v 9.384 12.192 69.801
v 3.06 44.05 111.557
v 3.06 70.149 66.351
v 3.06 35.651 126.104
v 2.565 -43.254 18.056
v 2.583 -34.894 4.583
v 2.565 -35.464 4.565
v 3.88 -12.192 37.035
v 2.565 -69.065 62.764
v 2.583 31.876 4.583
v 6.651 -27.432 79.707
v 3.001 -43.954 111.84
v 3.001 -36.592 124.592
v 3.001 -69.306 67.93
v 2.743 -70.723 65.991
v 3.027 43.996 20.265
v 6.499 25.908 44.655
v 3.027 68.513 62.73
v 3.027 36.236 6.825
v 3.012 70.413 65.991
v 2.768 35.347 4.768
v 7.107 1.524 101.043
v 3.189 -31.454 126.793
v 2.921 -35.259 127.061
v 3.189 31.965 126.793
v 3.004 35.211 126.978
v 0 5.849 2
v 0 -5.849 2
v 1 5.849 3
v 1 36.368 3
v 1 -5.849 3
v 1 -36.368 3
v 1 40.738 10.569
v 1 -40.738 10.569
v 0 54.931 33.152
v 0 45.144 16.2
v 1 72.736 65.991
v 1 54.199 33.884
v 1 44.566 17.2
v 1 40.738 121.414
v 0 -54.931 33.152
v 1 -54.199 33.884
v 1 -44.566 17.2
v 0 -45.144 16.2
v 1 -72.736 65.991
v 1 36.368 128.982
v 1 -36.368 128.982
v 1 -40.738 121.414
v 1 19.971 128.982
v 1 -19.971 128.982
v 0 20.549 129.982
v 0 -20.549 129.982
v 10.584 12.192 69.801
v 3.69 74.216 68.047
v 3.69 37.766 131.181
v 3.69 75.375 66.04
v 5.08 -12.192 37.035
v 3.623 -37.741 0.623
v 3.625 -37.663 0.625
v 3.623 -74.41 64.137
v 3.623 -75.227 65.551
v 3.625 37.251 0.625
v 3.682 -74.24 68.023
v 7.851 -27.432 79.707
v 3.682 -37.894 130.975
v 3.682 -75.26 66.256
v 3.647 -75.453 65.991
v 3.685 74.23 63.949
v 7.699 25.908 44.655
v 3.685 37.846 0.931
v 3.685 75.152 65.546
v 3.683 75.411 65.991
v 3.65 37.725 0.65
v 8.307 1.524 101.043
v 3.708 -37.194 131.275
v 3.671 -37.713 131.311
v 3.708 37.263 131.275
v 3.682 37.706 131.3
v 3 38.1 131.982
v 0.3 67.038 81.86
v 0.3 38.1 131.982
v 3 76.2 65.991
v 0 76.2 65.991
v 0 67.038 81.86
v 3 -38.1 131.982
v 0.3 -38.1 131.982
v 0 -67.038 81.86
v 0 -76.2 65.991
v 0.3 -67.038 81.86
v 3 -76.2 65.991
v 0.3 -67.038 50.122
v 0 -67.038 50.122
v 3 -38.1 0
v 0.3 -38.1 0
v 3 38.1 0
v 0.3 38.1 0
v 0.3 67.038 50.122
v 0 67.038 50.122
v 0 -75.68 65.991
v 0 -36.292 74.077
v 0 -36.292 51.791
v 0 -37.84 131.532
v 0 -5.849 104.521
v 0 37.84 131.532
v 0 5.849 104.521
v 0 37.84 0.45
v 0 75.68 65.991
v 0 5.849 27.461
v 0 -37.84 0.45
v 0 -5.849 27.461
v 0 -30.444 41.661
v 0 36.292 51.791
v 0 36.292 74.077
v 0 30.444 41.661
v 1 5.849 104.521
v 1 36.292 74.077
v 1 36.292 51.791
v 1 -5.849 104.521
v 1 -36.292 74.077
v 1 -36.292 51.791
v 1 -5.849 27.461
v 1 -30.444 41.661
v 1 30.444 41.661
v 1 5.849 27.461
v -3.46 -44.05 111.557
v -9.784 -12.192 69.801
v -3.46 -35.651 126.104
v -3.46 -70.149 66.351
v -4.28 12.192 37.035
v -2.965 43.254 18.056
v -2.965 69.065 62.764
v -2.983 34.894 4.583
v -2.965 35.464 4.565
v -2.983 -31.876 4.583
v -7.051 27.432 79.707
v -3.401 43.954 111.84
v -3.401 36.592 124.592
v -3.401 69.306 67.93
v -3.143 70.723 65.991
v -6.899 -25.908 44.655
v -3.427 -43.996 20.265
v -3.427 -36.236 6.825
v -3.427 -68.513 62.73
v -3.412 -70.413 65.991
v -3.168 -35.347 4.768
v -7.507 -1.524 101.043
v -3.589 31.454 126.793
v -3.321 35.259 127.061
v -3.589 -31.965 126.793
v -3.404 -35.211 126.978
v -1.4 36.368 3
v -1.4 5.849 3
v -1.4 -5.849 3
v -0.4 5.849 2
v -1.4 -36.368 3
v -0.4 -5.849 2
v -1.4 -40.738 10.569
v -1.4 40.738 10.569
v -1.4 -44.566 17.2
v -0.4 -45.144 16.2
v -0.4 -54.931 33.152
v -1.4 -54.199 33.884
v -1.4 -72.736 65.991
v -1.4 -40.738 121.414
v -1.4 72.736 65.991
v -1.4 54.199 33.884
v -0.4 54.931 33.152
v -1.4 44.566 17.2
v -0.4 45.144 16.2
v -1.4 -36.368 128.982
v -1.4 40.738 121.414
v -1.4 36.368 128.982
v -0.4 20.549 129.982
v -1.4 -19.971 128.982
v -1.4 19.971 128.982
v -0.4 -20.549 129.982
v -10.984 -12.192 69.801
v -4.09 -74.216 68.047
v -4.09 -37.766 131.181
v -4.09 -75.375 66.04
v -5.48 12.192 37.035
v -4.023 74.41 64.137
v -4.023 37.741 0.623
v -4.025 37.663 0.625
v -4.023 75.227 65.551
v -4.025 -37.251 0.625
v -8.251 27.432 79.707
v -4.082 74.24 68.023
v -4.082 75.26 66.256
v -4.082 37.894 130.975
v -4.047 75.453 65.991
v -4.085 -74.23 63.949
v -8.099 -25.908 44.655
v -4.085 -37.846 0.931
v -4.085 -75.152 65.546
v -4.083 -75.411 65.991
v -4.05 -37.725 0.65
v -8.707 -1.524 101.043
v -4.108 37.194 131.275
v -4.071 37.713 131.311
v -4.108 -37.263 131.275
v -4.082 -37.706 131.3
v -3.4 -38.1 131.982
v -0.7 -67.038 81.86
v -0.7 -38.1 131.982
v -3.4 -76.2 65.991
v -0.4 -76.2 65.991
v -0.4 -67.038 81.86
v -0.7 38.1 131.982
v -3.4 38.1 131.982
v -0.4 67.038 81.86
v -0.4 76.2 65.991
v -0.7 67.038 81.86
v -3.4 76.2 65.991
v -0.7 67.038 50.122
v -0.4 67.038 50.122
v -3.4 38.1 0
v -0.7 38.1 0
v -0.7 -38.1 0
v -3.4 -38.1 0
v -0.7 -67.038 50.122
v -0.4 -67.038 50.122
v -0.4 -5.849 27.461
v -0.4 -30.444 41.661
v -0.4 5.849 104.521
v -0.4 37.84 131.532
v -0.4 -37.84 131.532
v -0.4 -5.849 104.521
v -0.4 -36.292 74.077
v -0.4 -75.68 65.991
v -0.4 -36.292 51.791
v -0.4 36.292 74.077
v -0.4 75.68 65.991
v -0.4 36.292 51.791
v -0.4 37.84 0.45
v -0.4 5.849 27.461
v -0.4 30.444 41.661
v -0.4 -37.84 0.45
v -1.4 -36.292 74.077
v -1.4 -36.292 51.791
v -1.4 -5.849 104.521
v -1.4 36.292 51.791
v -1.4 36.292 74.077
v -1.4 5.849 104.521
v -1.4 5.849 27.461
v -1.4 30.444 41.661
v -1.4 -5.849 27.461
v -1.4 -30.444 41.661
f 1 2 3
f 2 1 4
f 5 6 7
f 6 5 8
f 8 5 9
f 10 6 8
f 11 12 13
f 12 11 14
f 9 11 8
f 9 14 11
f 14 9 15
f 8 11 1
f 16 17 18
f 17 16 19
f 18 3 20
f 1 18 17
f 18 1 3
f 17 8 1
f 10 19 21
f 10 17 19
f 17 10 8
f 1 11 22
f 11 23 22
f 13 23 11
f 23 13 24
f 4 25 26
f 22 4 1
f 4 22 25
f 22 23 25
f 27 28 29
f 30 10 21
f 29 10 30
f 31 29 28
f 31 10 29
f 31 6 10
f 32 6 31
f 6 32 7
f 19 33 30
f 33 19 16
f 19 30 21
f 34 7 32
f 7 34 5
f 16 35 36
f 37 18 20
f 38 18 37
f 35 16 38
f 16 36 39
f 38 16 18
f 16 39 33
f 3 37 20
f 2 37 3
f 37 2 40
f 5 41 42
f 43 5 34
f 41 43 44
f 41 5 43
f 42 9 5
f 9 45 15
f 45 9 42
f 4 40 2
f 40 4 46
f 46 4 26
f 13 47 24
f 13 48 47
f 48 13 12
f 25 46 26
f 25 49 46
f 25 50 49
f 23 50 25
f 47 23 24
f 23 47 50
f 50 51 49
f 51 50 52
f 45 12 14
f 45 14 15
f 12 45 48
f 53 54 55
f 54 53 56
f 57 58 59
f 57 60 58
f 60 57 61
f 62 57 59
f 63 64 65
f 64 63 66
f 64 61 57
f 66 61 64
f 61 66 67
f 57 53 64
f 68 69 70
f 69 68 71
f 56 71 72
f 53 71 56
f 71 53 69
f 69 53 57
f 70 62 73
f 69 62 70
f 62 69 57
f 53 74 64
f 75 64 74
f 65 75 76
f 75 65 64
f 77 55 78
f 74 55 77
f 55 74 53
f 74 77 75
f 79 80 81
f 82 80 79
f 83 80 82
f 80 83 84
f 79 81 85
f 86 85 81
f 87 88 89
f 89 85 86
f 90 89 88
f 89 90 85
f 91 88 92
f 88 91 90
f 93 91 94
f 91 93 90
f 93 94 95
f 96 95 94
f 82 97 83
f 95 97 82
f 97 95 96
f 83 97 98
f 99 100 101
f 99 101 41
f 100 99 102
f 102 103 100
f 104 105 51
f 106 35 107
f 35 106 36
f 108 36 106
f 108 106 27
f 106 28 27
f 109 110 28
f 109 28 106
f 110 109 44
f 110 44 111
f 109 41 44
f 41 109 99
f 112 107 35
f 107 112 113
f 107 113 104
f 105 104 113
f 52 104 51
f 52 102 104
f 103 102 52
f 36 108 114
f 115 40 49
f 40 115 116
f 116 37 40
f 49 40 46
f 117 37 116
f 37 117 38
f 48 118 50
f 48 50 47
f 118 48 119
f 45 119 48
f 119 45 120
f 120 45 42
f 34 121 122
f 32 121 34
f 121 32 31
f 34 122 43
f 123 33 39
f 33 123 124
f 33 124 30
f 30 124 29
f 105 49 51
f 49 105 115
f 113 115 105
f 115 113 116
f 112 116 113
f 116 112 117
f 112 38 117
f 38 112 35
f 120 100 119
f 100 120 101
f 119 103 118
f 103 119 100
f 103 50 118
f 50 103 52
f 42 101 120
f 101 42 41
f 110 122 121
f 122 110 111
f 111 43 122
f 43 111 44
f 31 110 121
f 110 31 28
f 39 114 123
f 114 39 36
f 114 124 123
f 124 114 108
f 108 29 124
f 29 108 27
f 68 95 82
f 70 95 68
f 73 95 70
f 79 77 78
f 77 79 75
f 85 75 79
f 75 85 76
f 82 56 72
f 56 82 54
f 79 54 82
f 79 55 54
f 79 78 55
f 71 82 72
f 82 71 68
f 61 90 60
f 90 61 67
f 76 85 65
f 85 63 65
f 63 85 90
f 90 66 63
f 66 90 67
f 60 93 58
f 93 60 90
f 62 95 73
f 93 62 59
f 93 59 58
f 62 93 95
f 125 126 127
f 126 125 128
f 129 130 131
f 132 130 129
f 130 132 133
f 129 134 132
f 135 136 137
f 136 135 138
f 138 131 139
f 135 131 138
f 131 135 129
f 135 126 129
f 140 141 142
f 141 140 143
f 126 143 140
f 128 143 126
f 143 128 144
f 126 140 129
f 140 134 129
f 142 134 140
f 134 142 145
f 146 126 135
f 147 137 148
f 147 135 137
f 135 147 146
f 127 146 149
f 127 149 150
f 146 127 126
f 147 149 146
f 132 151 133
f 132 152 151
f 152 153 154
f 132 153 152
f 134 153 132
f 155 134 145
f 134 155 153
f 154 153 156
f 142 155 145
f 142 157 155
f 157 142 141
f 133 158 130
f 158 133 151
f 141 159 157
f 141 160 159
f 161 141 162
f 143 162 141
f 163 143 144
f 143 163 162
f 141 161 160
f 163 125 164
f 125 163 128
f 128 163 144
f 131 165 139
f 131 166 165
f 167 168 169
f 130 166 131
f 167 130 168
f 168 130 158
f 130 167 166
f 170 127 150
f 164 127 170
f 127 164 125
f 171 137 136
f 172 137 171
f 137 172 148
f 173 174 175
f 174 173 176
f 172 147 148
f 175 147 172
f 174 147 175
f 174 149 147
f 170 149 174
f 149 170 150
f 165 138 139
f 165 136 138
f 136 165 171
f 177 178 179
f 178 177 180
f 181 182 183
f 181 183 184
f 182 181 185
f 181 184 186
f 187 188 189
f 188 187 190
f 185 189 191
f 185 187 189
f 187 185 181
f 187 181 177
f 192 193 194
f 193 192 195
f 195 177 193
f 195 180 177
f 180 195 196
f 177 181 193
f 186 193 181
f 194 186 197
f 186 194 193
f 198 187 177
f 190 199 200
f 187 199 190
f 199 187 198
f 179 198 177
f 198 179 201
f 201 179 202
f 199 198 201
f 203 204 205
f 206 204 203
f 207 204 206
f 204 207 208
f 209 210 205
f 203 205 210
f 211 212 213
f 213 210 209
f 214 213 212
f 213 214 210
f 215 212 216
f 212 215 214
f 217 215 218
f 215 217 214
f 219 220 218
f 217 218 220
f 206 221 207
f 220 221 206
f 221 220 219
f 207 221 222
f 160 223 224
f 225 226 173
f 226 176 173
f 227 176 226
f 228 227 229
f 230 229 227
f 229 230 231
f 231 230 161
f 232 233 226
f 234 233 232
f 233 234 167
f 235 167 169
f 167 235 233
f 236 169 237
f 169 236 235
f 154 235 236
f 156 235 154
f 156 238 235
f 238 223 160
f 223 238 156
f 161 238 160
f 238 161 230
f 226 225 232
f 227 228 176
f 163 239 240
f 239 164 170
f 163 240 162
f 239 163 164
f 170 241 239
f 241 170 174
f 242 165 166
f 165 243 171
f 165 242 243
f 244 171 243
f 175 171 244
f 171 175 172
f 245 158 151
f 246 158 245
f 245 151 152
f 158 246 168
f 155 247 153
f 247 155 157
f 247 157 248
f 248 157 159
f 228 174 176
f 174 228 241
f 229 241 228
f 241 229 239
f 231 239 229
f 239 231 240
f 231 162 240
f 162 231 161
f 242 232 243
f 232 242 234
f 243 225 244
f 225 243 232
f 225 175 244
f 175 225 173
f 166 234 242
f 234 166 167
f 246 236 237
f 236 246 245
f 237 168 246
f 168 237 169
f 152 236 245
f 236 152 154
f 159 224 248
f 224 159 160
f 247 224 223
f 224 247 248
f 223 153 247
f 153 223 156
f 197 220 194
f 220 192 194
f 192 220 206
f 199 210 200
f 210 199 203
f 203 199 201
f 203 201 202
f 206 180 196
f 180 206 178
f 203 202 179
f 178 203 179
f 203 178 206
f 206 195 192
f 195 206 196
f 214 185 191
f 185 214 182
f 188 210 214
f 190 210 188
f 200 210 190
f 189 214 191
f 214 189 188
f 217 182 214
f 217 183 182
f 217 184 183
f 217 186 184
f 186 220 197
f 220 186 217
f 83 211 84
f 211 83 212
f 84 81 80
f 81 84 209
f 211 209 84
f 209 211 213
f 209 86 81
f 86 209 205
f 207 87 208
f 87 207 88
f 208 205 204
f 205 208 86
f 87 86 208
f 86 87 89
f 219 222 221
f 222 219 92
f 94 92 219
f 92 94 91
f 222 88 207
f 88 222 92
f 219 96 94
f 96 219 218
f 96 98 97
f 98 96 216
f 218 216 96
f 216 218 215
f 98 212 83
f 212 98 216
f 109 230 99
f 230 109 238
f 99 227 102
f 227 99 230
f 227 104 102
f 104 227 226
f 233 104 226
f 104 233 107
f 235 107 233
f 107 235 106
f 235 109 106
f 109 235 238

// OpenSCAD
// Hexagon wall tile v42 — parametric rebuild of v30
// Front: identical low-poly facets to v30 (same facet angles at every size).
// Edge profile: identical on every size (edge depth, rim width) so tiles butt flush.
// Back: six corner pads for 1" (25 mm) double-sided mounting tape.
// v32: tape pads are flat plates hung from the rim with an air gap to the front skin.
// v33: thinner skin + thinner pads so the air gap is 1.4 mm even right at the edges
//      (v32 had only 0.8 mm there and showed marks along the slanted edges).
// v34: snap-off stabilizer fins behind the bottom edge so the tall, thin tile can't tip over
//      while printing. Break them off afterwards (bend sideways) and the back stays flat.
// v35: 0.6 mm 45° chamfer on the front edge (crisp, consistent shadow line between tiles; hides
//      first-layer squish and brim trim marks) + relief_scale to deepen the facets if wanted.
// v37: much smaller breakaway tabs (0.8 x 0.6 mm, every 8 mm) so the fins snap off easily.
// v38: full-height snap-off BRACE FRAME behind the tile: a thin hex ring + X/vertical bars,
//      1 mm behind the back, tied to the tile rim by tiny tabs all the way round (incl. the top).
//      Tile + brace act as a stiff box while printing; the fins now sit on the brace.
//      Peel the brace off after printing — the tabs only touch the back rim.
// v39: PAIR mode (default): two identical tiles printed back-to-back, 0.4 mm apart, so each
//      cradles the other full-height. Only 12 tiny tabs (corners + mid-sides) join the back
//      rims — twist/peel the tiles apart. No brace, no fins, almost no waste. The pair is
//      turned 90° on the bed so the 'back' seam lands on a side edge, not on either face.
// v40: pair tabs spaced evenly every ~pair_tab_pitch mm round the rim on EVERY size. In v39 the
//      tab spacing grew with the tile (3": ~23 mm max gap, 6": ~46 mm, 10": ~79 mm), so the 3" pair
//      printed perfectly but the 6" rims flexed apart between tabs and broke up above mid-height.
//      Now every size has the same tab spacing as a stiff 3" pair (or tighter).
// v42: tabs replaced by one continuous hairline SEAM round the outer edge of the pair gap.
//      Discrete tabs changed the toolpath on every layer that had a tab, leaving a faint line
//      across the tile every ~10 mm of height. With a continuous seam every layer has the same
//      shape, so there is nothing to print differently. Separate the tiles by running a utility
//      knife along the seam line on the edges, then twist apart.
// Prints upright on a flat edge with NO supports (every downward edge is 45° or steeper).
//
// Export one size at a time, e.g.:
//   openscad -D size_in=6 -o hex_pair_v42_6in.stl hex_wall_tile_v42.scad

/* [Size] */
size_in       = 6;      // point-to-point width in inches (3, 6, 10 ...)

/* [Edge profile — keep identical across sizes] */
// Space behind the skin at the edge = edge_depth - skin; it must be >= pad_plate + pad_gap + pad_recess.
edge_depth    = 3.6;    // depth of the outer edge, back plane to front face (mm)
rim           = 2.0;    // perimeter wall thickness at the back plane (mm)
front_chamfer = 0.6;    // 45° chamfer on the front edge (mm); 0 = sharp edge

/* [Look] */
relief_scale  = 1.0;    // 1.0 = v30 facets; 1.5 = 50% deeper facets (same edge profile on all sizes)

/* [Front skin] */
skin          = 1.2;    // front skin thickness (mm) — 3 lines at 0.4 mm, same on all sizes

/* [Tape pads] */
tape_width    = 25.4;   // tape width (mm)
pad_margin    = 3;      // extra pad width beyond the tape (mm)
pad_max_frac  = 0.45;   // pad never larger than this fraction of the tile radius (keeps 3" usable)
pad_plate     = 1.0;    // thickness of the pad plates (mm)
pad_gap       = 1.4;    // minimum air gap between pads and the front skin (mm) — keeps the front clean
pad_recess    = 0;      // pads set back from the rim (mm); >0 lets the rim touch the wall,
                        // but near the edges the plate is then trimmed thinner to keep pad_gap

/* [Print stabilizers (snap off after printing)] */
stabilizers   = false;  // v34-v38 option; not needed in pair mode
fin_count     = 2;      // fins behind the bottom edge, placed symmetrically
fin_thick     = 1.6;    // fin thickness (mm)
fin_height_frac = 0.35; // fin height as a fraction of the tile height
fin_depth_frac  = 0.4;  // fin depth behind the brace as a fraction of fin height
fin_depth_min   = 15;   // (mm)
fin_gap       = 0.5;    // air gap between fin and tile back (mm)
tab_height    = 0.6;    // breakaway tab height (mm, vertical when printing) — 3 layers at 0.2
tab_width     = 0.8;    // breakaway tab width (mm), centred on the fin — 2 lines
tab_pitch     = 8;      // spacing between tabs (mm)

/* [Full-height brace frame (snap off after printing)] */
brace         = false;  // v38 option; not needed in pair mode
brace_gap     = 1.0;    // air gap between tile back and brace (mm)
brace_thick   = 1.6;    // brace thickness (mm)
brace_rim_w   = 4;      // width of the brace's hex ring (mm)
brace_bar_w   = 3;      // width of the X and vertical bars (mm)
brace_tab_pitch = 10;   // spacing of brace tabs along each rim side (mm)
brace_tab     = 0.8;    // brace tab size (mm) — tiny, so the brace peels off

/* [Back-to-back pair (default)] */
pair          = true;
pair_gap      = 0.4;    // gap between the two back planes (mm): close enough to cradle, not fused
pair_tab      = 0.6;    // tab size (mm) — tiny, so the pair twists apart
pair_tab_pitch = 12;    // (v40 tabs, unused when pair_seam_w > 0)
pair_seam_w   = 0.45;   // width of the continuous edge seam bridging the gap (mm) — about one line

/* [Output] */
orient_for_print = true; // stand upright on a flat edge, back facing +Y

/* [Hidden] */
R   = size_in * 25.4 / 2;         // corner radius
AP  = R * cos(30);                // apothem
PAD = min(tape_width + pad_margin, R * pad_max_frac);

// Normalised front geometry from v30 (x, y in units of R; z = relief above edge, units of R)
FP = [[1,0,0],[0.5,0.866025,0],[-0.5,0.866025,0],[-1,0,0],[-0.5,-0.866025,0],[0.5,-0.866025,0],
      [0.16,0.05,0.091654],[-0.16,-0.38,0.019428],[-0.36,0.18,0.05579],[0.34,-0.28,0.053795],[0.02,0.46,0.061766]];
FACES = [[0,6,1],[4,3,7],[5,4,7],[8,3,2],[7,3,8],[7,8,6],[5,9,0],[9,6,0],[9,7,6],[5,7,9],
         [6,8,10],[8,2,10],[6,10,1],[10,2,1],
         [1,12,11,0],[2,13,12,1],[3,14,13,2],[4,15,14,3],[5,16,15,4],[0,11,16,5],
         [11,12,13,14,15,16]];
RELIEF_MAX = 0.091654 * R * relief_scale;
D = edge_depth + RELIEF_MAX + 1;  // max depth used for chamfers

// Solid bounded by the faceted front (shifted by dz) and a flat back at z = zb
module body(dz = 0, zb = 0) {
    pts = concat(
        [for (p = FP) [p[0]*R, p[1]*R, edge_depth + p[2]*R*relief_scale + dz]],
        [for (i = [0:5]) [FP[i][0]*R, FP[i][1]*R, zb]]);
    polyhedron(points = pts, faces = FACES, convexity = 4);
}

module hex2d(apothem) { circle(r = apothem / cos(30), $fn = 6); }

// Back cavity: behind the skin, inside the rim; rim inner faces slope 45° so nothing needs support
module cavity(extra = 0) {
    H  = D + 2;
    a0 = AP - rim - extra + 1;             // apothem at z = -1
    intersection() {
        body(dz = -skin - extra, zb = -1);
        translate([0, 0, -1]) linear_extrude(height = H, scale = (a0 - H) / a0) hex2d(a0);
    }
}

// Corner pad footprint (2D), k = corner index 0..5:
// the corner region of the inner hex, PAD wide, long enough to hold a PAD x PAD square of tape
module pad_core(k) {
    U0  = (AP - rim) / cos(30);                    // inner corner distance from centre
    LEN = PAD / (2 * tan(60)) + PAD + 1;           // apex taper + full square + margin
    intersection() {
        hex2d(AP - rim + 0.3);                     // overlap 0.3 mm into the rim to fuse
        rotate(60 * k) translate([U0 - LEN, -PAD / 2]) square([LEN + 5, PAD]);
    }
}

// In-plane self-support: printed upright, a vertical plate needs every downward edge at >= 45°.
// Sweep each pad toward the nearest rim side below it at 45° (or straight down for bottom corners).
SWEEP = [[1, -1], [1, -1], [-1, -1], [-1, -1], [0, -1], [0, -1]];
module pad_fp(k) {
    intersection() {
        hex2d(AP - rim + 0.3);
        hull() { pad_core(k); translate(SWEEP[k] * R) pad_core(k); }
    }
}

module pads() {
    intersection() {
        body(dz = -skin - pad_gap, zb = -1);       // never closer than pad_gap to the skin
        translate([0, 0, pad_recess]) linear_extrude(pad_plate) for (k = [0:5]) pad_fp(k);
    }
}

module chamfer_clip() {
    HB = D + 5;
    union() {
        translate([0, 0, -2]) linear_extrude(edge_depth - front_chamfer + 2) hex2d(AP + 1);
        translate([0, 0, edge_depth - front_chamfer]) linear_extrude(height = HB, scale = (AP - HB) / AP) hex2d(AP);
    }
}

module tile() {
    intersection() {
        union() {
            difference() { body(); cavity(); }
            pads();
        }
        if (front_chamfer > 0) chamfer_clip(); else translate([-2*R, -2*R, -5]) cube([4*R, 4*R, 4*R]);
    }
}

// Triangular fins standing on the bed behind the back (model z < 0), joined to the tile by small tabs
FIN_H = fin_height_frac * 2 * AP;
FIN_L = max(fin_depth_min, fin_depth_frac * FIN_H);
function fin_x(i) = (fin_count == 1) ? 0 : (-1 + 2 * i / (fin_count - 1)) * 0.35 * R;
BZ = brace ? brace_gap + brace_thick : 0;          // fins start behind the brace when it is used
module stabilizer_fins() {
    for (i = [0 : fin_count - 1]) {
        x = fin_x(i);
        fg = brace ? BZ - 0.3 : fin_gap;                // with a brace: fused into it (no tabs needed)
        hull() {                                            // fin: vertical triangle
            translate([x - fin_thick/2, -AP, -fg - FIN_L]) cube([fin_thick, 0.01, FIN_L]);
            translate([x - fin_thick/2, -AP, -fg - 0.01]) cube([fin_thick, FIN_H, 0.01]);
        }
        if (!brace)
            for (y = [0 : tab_pitch : FIN_H - tab_height])  // breakaway tabs into the back plane
                translate([x - tab_width/2, -AP + y, -fin_gap - 0.05]) cube([tab_width, tab_height, fin_gap + 0.35]);
    }
}

// Brace frame (2D, in the tile plane). Printed upright, so every downward-facing edge is >= 45°:
// the top bar is carried by 45° roofs in the two top windows; bars run vertical or at ±60°.
module brace_2d() {
    W  = brace_rim_w;
    Yt = AP - W;                                        // underside of the top ring bar
    difference() {
        hex2d(AP);
        intersection() {                                // the open window, with a 45° roof under the top bar
            hex2d(AP - W);
            // only the two top windows touch the top bar: give them a 45° valley roof
            polygon([[-2*R, -2*R], [2*R, -2*R], [2*R, 2*R], [R/2, 2*R], [R/2, Yt],
                     [0, Yt - R/2], [-R/2, Yt], [-R/2, 2*R], [-2*R, 2*R]]);
        }
    }
    intersection() {
        hex2d(AP);
        union() {
            square([brace_bar_w, 2*AP], center = true);                 // vertical bar
            rotate(60)  square([4*R, brace_bar_w], center = true);      // ±60° diagonals (corner to corner)
            rotate(-60) square([4*R, brace_bar_w], center = true);
        }
    }
}

module brace_frame() {
    translate([0, 0, -BZ]) linear_extrude(brace_thick) brace_2d();
    // tiny tabs across the gap, on the tile's back rim (1 mm in from the outline), all six sides
    for (k = [0:5]) {
        a0 = 60*k; a1 = 60*(k+1);
        p0 = [ (R - 1/sin(60)) * cos(a0), (R - 1/sin(60)) * sin(a0) ];
        p1 = [ (R - 1/sin(60)) * cos(a1), (R - 1/sin(60)) * sin(a1) ];
        L  = norm(p1 - p0);
        n  = floor((L - 6) / brace_tab_pitch);
        for (j = [0 : n]) {
            t = (3 + j * (L - 6) / max(n, 1)) / L;
            p = p0 + t * (p1 - p0);
            translate([p[0], p[1], -brace_gap - 0.3]) rotate(a0 + 120)
                translate([-brace_tab/2, -brace_tab/2, 0]) cube([brace_tab, brace_tab, brace_gap + 0.6]);
        }
    }
}

// Tabs across the pair gap, evenly spaced along each rim side (1 mm in from the outline)
module pair_tabs() {
    rr = R - 1/sin(60);
    n  = max(2, ceil(rr / pair_tab_pitch));          // side length = rr
    for (k = [0:5]) for (i = [0:n-1]) {
        f  = (i + 0.5) / n;
        a0 = 60*k; a1 = 60*(k+1);
        p = [rr*cos(a0), rr*sin(a0)] + f * ([rr*cos(a1), rr*sin(a1)] - [rr*cos(a0), rr*sin(a0)]);
        translate([p[0], p[1], -pair_gap - 0.3]) rotate(a0 + 120)
            translate([-pair_tab/2, -pair_tab/2, 0]) cube([pair_tab, pair_tab, pair_gap + 0.6]);
    }
}
// Continuous hairline seam round the outline, bridging the gap between the two back planes
module pair_seam() {
    translate([0, 0, -pair_gap - 0.3]) linear_extrude(pair_gap + 0.6)
        difference() { hex2d(AP); hex2d(AP - pair_seam_w); }
}
module partner() { translate([0, 0, -pair_gap]) rotate([0, 180, 0]) tile(); }   // same tile turned round, not mirrored

module assembly() {
    tile();
    if (pair) { partner(); if (pair_seam_w > 0) pair_seam(); else pair_tabs(); }
    else { if (brace) brace_frame(); if (stabilizers) stabilizer_fins(); }
}

if (orient_for_print)
    rotate([0, 0, pair ? 90 : 0]) translate([0, 0, AP]) rotate([90, 0, 0]) assembly();
else
    assembly();
